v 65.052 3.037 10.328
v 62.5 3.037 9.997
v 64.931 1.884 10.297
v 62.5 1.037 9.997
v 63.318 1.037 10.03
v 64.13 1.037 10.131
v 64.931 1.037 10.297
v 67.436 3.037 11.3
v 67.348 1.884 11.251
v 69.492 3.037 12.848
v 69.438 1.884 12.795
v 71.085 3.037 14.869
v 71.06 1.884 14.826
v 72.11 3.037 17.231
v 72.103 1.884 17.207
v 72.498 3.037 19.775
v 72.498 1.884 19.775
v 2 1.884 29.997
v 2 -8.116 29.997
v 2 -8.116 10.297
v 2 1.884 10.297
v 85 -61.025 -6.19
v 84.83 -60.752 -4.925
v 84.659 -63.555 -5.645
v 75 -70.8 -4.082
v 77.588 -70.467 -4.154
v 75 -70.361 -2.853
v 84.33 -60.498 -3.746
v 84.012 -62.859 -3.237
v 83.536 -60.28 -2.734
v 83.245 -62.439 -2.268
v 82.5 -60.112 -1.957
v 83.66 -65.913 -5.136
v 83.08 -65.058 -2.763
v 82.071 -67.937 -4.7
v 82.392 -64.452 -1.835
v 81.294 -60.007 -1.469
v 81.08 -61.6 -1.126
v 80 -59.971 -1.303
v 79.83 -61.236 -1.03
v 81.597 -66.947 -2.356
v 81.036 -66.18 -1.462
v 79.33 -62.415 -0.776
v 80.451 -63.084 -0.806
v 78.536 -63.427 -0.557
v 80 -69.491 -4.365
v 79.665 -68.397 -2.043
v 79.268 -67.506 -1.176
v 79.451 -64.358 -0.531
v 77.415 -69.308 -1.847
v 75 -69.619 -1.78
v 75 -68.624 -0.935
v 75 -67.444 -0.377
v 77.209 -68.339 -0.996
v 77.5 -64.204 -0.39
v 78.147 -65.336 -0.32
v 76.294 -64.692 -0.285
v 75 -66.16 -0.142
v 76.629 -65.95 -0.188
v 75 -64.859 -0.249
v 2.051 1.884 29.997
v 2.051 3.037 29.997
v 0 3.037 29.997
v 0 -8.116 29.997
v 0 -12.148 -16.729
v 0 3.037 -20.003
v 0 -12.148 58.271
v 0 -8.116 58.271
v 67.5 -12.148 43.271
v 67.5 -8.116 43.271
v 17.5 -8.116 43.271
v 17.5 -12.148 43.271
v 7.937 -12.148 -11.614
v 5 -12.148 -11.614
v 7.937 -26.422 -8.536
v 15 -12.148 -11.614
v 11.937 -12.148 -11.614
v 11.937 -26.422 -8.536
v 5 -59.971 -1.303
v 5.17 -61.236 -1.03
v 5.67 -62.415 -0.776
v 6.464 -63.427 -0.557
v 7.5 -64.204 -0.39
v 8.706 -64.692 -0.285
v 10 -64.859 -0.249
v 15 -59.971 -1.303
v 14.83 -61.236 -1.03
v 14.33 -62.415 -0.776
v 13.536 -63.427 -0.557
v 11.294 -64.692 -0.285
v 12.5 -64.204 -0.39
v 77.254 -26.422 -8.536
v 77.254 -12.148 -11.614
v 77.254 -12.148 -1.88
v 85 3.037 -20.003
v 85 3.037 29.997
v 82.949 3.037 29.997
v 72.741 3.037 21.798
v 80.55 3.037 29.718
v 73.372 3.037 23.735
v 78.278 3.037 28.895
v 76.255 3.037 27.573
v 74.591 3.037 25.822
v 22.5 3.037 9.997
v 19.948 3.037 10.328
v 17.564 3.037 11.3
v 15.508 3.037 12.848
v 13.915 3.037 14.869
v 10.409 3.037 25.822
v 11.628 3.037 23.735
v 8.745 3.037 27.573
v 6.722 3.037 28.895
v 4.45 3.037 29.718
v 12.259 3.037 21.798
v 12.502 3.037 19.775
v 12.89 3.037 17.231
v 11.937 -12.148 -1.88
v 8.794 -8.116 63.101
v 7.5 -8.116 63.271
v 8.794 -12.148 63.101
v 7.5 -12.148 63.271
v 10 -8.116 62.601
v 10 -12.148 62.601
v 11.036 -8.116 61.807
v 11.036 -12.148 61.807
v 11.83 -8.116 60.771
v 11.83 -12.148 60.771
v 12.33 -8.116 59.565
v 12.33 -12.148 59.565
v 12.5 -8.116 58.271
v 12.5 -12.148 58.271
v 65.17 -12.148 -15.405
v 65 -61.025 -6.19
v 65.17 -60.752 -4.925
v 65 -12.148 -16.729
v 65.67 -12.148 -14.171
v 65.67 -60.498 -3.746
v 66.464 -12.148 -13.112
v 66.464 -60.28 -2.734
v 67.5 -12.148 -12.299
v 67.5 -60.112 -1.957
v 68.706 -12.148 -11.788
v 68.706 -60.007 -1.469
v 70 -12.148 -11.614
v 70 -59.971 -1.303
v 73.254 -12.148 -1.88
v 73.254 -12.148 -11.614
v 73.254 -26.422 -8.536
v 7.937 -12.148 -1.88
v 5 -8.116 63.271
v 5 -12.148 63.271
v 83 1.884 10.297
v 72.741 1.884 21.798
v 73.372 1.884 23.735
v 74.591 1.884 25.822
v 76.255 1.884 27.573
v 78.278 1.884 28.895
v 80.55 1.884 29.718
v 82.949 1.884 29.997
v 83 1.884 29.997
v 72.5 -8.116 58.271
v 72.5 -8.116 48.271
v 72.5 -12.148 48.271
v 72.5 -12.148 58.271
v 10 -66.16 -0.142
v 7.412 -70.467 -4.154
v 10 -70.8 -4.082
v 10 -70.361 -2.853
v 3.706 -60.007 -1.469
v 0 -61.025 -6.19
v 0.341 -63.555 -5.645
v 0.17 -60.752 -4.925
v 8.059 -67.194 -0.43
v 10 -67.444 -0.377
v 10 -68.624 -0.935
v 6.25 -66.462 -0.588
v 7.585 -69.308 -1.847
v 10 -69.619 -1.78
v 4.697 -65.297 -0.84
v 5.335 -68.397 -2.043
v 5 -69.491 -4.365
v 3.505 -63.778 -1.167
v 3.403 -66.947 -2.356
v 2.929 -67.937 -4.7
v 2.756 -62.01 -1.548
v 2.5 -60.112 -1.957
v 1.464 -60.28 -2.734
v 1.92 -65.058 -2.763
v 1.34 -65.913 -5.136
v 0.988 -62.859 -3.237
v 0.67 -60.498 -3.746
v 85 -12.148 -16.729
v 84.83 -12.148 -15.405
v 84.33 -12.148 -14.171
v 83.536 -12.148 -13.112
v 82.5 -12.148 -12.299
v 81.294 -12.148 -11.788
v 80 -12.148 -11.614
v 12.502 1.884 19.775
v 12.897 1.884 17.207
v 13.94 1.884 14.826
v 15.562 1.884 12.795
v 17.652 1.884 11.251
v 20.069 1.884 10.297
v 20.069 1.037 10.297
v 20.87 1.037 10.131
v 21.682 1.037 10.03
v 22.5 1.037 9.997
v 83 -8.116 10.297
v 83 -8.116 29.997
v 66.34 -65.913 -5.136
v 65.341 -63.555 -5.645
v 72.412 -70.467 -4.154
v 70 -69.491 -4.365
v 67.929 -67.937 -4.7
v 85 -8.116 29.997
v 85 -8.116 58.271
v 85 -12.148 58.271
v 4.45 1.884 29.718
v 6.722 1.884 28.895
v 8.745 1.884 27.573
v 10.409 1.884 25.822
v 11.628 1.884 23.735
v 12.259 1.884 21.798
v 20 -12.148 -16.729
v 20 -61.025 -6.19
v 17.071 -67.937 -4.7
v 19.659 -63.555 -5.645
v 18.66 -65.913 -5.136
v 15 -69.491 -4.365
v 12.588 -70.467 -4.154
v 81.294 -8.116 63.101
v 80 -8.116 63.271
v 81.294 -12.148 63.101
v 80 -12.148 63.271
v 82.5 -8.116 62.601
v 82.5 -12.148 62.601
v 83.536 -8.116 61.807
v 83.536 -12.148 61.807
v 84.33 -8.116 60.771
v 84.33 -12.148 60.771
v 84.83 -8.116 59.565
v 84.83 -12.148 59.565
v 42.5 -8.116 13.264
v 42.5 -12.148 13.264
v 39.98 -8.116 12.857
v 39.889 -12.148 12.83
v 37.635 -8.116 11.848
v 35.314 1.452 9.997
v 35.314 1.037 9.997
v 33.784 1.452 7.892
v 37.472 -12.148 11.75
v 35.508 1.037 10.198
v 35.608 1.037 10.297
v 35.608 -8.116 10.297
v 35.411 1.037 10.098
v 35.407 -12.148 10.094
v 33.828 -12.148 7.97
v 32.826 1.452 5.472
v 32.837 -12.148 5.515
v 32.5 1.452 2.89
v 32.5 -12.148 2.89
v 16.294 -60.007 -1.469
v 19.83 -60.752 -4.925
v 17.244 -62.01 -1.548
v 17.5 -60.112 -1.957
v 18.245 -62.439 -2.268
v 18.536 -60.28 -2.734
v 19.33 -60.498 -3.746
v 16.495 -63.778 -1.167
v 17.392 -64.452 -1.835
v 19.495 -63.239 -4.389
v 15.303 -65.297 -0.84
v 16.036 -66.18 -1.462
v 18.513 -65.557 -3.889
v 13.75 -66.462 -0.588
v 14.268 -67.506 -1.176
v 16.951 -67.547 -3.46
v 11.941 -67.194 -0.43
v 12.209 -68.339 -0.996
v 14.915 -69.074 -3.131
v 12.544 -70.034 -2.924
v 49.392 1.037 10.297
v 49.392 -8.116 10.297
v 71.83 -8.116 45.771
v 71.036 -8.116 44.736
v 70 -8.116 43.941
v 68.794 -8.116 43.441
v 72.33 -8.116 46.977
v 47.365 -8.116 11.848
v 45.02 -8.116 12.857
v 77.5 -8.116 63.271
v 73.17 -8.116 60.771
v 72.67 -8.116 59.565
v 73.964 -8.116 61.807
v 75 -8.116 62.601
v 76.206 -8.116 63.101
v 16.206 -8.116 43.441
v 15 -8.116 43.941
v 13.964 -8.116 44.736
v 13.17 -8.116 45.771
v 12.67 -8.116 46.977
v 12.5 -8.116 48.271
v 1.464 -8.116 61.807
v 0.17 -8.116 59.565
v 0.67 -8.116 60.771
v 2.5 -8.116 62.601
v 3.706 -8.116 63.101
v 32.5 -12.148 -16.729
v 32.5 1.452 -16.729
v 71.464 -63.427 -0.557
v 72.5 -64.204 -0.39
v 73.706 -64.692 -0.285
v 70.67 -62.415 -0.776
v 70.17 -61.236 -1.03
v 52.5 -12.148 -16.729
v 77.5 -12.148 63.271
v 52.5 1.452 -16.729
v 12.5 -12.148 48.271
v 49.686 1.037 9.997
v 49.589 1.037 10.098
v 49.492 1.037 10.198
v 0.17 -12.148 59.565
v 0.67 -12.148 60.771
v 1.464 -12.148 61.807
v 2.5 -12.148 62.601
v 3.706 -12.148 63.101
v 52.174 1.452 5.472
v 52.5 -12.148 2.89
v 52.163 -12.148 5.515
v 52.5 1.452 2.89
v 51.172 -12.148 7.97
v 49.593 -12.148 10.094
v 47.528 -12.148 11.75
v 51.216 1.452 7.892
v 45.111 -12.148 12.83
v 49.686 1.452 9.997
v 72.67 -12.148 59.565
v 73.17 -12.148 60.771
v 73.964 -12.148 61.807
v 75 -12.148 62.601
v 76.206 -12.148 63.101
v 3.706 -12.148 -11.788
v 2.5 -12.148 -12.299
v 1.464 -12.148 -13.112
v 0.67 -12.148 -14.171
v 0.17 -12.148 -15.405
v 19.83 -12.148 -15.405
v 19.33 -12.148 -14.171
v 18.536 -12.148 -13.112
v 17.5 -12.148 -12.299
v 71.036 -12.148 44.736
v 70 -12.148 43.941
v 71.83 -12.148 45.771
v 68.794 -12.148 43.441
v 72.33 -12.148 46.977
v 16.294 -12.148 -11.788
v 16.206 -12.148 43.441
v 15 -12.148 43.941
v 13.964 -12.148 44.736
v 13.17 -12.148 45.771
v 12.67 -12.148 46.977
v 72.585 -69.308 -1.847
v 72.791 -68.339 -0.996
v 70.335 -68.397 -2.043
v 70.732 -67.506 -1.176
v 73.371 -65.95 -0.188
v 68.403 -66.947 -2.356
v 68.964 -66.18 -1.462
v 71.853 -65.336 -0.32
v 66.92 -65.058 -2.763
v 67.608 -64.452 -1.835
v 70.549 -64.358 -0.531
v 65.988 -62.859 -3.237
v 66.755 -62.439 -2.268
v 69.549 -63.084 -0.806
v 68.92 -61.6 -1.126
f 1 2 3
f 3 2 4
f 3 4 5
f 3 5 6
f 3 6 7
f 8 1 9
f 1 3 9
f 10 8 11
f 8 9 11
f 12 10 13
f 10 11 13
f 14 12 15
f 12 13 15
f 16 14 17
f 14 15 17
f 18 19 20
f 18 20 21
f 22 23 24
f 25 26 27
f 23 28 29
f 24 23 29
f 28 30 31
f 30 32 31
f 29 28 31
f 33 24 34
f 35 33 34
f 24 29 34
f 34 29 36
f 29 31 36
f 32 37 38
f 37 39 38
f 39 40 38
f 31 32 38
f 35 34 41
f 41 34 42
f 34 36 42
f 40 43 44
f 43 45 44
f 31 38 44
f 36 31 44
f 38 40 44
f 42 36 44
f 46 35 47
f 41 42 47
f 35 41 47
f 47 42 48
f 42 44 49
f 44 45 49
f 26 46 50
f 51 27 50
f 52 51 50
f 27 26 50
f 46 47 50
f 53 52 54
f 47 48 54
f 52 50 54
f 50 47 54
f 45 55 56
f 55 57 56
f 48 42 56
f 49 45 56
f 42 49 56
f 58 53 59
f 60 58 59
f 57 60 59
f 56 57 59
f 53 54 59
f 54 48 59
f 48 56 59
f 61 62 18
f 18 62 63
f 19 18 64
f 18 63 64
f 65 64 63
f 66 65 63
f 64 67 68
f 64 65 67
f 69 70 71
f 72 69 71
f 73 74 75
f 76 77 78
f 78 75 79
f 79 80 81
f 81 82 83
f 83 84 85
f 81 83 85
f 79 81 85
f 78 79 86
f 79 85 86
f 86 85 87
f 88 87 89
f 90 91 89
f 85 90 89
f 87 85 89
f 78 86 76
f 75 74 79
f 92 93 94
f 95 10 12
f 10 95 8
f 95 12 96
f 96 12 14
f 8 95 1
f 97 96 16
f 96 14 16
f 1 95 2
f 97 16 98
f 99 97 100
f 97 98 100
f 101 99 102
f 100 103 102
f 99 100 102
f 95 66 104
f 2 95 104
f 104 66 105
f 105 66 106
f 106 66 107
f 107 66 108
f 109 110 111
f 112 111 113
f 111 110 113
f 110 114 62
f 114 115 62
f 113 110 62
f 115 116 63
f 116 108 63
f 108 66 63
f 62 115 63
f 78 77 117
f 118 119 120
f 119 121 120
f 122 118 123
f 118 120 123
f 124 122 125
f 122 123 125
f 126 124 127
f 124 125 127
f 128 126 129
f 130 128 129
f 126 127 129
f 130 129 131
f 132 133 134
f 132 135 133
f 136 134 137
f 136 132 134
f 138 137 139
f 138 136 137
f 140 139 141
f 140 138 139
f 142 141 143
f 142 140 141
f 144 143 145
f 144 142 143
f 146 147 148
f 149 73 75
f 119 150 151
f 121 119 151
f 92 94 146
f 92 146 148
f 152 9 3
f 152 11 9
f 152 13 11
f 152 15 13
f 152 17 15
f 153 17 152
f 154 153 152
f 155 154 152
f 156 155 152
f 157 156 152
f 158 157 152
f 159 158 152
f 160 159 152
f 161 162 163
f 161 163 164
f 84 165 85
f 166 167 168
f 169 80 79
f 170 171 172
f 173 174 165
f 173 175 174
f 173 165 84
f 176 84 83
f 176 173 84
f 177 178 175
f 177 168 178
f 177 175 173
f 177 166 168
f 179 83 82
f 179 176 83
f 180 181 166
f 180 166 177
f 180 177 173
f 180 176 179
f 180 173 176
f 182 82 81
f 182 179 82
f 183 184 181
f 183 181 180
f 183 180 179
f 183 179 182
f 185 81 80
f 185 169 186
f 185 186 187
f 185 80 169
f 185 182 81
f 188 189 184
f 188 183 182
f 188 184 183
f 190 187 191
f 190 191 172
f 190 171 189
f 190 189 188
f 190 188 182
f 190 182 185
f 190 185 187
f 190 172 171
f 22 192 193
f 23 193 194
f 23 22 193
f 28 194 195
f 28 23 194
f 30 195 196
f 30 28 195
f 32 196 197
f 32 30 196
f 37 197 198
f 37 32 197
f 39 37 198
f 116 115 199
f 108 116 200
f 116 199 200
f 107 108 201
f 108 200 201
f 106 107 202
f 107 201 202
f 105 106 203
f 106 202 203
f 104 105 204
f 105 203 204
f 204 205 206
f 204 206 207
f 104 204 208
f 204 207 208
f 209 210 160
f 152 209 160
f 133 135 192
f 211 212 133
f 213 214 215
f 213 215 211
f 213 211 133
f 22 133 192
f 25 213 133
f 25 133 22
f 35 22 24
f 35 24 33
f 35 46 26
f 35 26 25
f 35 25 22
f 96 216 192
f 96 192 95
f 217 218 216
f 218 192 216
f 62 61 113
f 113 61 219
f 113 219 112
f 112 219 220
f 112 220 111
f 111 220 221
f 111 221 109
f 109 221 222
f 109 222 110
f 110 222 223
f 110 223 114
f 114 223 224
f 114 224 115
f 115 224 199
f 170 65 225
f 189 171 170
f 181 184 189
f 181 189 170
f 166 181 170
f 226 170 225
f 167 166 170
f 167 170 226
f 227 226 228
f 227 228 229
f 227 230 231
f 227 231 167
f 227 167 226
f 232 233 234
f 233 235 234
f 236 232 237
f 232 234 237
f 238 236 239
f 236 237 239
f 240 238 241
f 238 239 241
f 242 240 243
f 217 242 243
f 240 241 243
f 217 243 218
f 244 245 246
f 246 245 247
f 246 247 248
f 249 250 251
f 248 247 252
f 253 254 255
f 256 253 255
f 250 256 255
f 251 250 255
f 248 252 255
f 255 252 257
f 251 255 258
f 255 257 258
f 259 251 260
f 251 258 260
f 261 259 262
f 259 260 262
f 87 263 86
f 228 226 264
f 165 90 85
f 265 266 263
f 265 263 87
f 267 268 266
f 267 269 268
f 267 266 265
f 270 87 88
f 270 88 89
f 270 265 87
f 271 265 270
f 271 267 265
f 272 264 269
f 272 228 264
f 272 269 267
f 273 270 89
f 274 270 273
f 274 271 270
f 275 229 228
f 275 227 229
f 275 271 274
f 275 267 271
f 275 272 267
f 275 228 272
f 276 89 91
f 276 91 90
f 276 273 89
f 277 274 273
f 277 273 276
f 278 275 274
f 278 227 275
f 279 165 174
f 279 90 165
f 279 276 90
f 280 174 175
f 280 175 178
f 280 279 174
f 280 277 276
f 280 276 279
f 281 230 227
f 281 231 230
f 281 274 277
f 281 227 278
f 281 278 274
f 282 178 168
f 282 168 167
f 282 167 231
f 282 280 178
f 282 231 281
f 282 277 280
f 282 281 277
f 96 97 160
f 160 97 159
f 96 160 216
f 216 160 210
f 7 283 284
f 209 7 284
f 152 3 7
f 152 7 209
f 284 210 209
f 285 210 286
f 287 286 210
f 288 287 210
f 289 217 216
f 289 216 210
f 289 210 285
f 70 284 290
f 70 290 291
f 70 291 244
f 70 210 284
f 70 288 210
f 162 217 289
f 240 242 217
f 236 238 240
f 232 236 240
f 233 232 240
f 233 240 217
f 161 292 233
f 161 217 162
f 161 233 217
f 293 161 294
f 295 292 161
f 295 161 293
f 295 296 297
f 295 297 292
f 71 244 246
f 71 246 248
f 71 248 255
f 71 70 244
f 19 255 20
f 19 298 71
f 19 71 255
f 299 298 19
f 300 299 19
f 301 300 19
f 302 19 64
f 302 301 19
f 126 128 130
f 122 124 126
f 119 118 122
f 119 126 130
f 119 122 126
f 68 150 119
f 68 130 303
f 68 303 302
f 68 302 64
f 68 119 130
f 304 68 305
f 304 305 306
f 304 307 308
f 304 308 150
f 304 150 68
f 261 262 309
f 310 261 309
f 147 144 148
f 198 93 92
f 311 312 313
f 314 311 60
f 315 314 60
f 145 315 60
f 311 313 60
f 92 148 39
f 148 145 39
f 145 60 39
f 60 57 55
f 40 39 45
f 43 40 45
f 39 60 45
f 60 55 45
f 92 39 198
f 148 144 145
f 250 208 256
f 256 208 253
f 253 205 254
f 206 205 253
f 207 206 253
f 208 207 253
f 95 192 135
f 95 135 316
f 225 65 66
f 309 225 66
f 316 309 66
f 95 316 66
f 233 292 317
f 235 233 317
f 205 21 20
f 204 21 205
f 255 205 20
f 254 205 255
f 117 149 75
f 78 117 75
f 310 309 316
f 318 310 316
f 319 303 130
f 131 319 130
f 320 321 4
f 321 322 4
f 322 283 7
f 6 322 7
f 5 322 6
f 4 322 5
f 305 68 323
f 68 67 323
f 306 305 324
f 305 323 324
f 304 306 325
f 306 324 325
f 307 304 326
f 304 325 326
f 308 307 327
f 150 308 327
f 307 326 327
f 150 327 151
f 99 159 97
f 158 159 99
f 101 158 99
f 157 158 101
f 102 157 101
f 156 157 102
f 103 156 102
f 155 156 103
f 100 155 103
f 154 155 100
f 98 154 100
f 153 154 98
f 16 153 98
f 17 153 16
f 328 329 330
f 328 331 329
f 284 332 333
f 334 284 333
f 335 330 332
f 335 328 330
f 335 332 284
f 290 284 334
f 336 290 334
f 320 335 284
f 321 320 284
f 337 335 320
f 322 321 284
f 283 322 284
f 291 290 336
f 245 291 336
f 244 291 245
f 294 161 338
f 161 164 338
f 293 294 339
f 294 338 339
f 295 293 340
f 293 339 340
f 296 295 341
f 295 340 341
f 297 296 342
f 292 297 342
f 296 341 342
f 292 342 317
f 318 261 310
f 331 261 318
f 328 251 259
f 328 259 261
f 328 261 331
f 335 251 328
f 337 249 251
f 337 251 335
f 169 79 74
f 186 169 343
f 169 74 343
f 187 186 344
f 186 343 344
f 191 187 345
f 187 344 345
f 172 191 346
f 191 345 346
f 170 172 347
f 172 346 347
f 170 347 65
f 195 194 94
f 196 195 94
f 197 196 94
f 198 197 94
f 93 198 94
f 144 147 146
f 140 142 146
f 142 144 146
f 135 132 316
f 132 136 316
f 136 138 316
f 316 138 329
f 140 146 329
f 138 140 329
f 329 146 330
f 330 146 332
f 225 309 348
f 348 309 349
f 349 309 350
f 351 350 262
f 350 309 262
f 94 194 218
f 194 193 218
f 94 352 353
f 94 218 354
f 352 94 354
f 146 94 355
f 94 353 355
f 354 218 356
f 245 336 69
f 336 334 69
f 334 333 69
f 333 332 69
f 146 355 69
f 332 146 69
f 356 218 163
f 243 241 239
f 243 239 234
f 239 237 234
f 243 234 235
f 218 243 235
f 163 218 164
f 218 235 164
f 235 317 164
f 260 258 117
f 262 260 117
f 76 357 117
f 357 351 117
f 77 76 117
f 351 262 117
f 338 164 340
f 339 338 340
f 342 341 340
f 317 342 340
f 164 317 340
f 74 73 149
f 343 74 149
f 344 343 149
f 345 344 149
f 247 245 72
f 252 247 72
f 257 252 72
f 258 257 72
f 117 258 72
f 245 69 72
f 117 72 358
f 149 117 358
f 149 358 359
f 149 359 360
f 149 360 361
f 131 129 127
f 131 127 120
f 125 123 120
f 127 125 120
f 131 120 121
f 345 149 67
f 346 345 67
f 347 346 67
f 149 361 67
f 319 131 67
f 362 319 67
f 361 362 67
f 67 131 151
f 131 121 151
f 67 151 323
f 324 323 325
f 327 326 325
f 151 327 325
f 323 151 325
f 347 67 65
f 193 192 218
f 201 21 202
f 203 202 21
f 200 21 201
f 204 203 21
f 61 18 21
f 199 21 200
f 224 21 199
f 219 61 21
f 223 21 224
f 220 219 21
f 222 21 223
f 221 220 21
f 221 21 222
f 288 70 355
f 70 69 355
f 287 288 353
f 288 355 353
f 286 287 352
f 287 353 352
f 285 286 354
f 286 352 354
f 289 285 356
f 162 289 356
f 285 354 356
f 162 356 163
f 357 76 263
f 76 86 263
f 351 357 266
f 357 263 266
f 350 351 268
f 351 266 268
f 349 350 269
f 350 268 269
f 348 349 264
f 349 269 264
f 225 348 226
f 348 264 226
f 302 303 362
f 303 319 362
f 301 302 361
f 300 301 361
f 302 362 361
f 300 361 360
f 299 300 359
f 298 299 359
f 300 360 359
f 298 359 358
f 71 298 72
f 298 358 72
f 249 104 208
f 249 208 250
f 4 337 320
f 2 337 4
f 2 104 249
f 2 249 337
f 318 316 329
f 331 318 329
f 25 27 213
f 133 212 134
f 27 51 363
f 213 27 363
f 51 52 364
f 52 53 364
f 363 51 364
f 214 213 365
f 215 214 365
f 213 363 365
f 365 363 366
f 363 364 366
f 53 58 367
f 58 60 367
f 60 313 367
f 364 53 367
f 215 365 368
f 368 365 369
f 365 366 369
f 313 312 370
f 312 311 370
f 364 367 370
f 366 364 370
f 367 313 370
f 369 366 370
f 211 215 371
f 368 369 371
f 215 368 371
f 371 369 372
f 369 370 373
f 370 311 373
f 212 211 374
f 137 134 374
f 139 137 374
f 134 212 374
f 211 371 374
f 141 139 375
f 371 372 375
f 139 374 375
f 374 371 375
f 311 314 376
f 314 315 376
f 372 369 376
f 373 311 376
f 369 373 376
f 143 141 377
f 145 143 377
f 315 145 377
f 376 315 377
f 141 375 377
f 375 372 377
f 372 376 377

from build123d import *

# Parameters (mm, degrees)
F1_DEPTH      = 85
F3_W          = 81
F3_H          = 10
F4_DEPTH      = 20
F7_DEPTH      = 13.6
F9_W          = 60
F9_H          = 20
F10_DEPTH     = 2
F12_W         = 20
F12_H         = 60
F13_DEPTH     = 5
F14_T1_DEPTH  = 55
F15_R         = 4.99999
F16_R         = 10
F18_W         = 60
F18_H         = 20
F19_DEPTH     = 4.5
F20_R         = 5
F21_R         = 10.4535447251
F22_W         = 4
F22_H         = 13
F23_DEPTH     = 20
F24_T4_DEPTH  = 107.6390188569
F25_W         = 4
F25_H         = 9.7337032971
F26_DEPTH     = 15
F27_T4_DEPTH  = 81.7292641427
F28_T1_DEPTH  = 4.0324145269
F28_T6_DEPTH  = 55.9380061179
F28_T13_DEPTH = 55.9380061179
F28_T20_DEPTH = 29.9852103224
F28_T26_DEPTH = 55.9380061179


# Not quite as in the source:
# - a fillet or chamfer that OpenCascade refuses, or shapes differently, is made with other operations: its cross-section is extruded or revolved along the edge and cut away or added
# - a fillet or chamfer is up to 0.001 mm smaller than in the source, because OpenCascade refuses the exact size


with BuildPart() as f1:
    # F0 (on Right) → F1 (new body)
    with BuildSketch(Plane.YZ):
        Polygon((-12.1484044939, 63.271041885), (-12.1484044939, -16.728958115), (3.0366472241, -20.0031517962), (3.0366472241, 29.9968482038), (-8.115989967, 29.9968482038), (-8.115989967, 63.271041885), align=None)
    extrude(amount=F1_DEPTH)

    # F3 (on offset) → F4 (cut)
    with BuildSketch(Plane.XY.offset(30.2968482038)):
        with Locations((42.5, -3.115989967)):
            Rectangle(F3_W, F3_H)
    extrude(amount=-F4_DEPTH, mode=Mode.SUBTRACT)

    # F6 (on offset) → F7 (cut)
    with BuildSketch(Plane.XZ.offset(12.1484044939)):
        Polygon((32.5, -16.728958115), (42.5, -16.728958115), (52.5, -16.728958115), (52.5, 13.271041885), (42.5, 13.271041885), (32.5, 13.271041885), align=None)
    extrude(amount=-F7_DEPTH, mode=Mode.SUBTRACT)

    # F9 (on offset) → F10 (cut)
    with BuildSketch(Plane(origin=(0, 3.0366472241, 0), x_dir=(-1, 0, 0), z_dir=(0, 1, 0))):
        with Locations((-42.5, 19.9968482038)):
            Rectangle(F9_W, F9_H)
    extrude(amount=-F10_DEPTH, mode=Mode.SUBTRACT)

    # F12 (on offset) → F13 (join)
    with BuildSketch(Plane(origin=(0, -3.986549235, -18.488813492), x_dir=(1, 0, 0), z_dir=(0, -0.210775525, -0.9775344894))):
        with Locations((75, 38.3494294545)):
            Rectangle(F12_W, F12_H)
        with Locations((10, 38.3494294545)):
            Rectangle(F12_W, F12_H)
    extrude(amount=-F13_DEPTH)

    # F14: fillet of radius 10 on 4 edges, made by hand

    # F14_s2 → F14_t1 (cut)
    with BuildSketch(Plane(origin=(0, -9.2559373608, -42.927175728), x_dir=(1, 0, 0), z_dir=(0, 0.210775525, 0.9775344894))):
        with BuildLine():
            ThreePointArc((75, -68.3494294545), (67.9289321881, -65.4204972664), (65, -58.3494294545))
            Line((65, -58.3494294545), (65, -68.3494294545))
            Line((65, -68.3494294545), (75, -68.3494294545))
        make_face()
        with BuildLine():
            ThreePointArc((10, -68.3494294545), (2.9289321881, -65.4204972664), (0, -58.3494294545))
            Line((0, -58.3494294545), (0, -68.3494294545))
            Line((0, -68.3494294545), (10, -68.3494294545))
        make_face()
        with BuildLine():
            ThreePointArc((20, -58.3494294545), (17.0710678119, -65.4204972664), (10, -68.3494294545))
            Line((10, -68.3494294545), (20, -68.3494294545))
            Line((20, -68.3494294545), (20, -58.3494294545))
        make_face()
        with BuildLine():
            ThreePointArc((75, -68.3494294545), (82.0710678119, -65.4204972664), (85, -58.3494294545))
            Line((85, -58.3494294545), (85, -68.3494294545))
            Line((85, -68.3494294545), (75, -68.3494294545))
        make_face()
    extrude(amount=F14_T1_DEPTH, mode=Mode.SUBTRACT)

    # F15 (radius 5 in the source; OpenCascade refuses exactly that, so slightly less here)
    f15_edges = [f1.edges().sort_by_distance(p)[0] for p in [
        (85, -36.059828, -6.458279),
        (20, -36.059828, -6.458279),
    ]]
    fillet(f15_edges, radius=F15_R)

    # F16
    f16_edges = [f1.edges().sort_by_distance(p)[0] for p in [
        (12.5, 2.036647, 9.996848),
        (72.5, 2.036647, 9.996848),
    ]]
    fillet(f16_edges, radius=F16_R)

    # F18 (on offset) → F19 (cut)
    with BuildSketch(Plane(origin=(0, -8.115989967, 0), x_dir=(-1, 0, 0), z_dir=(0, 1, 0))):
        with Locations((-42.5, 53.271041885)):
            Rectangle(F18_W, F18_H)
    extrude(amount=-F19_DEPTH, mode=Mode.SUBTRACT)

    # F20
    f20_edges = [f1.edges().sort_by_distance(p)[0] for p in [
        (72.5, -10.132197, 63.271042),
        (85, -10.132197, 63.271042),
        (72.5, -10.132197, 43.271042),
        (12.5, -10.132197, 43.271042),
        (12.5, -10.132197, 63.271042),
        (0, -10.132197, 63.271042),
    ]]
    fillet(f20_edges, radius=F20_R)

    # F21
    f21_edges = [f1.edges().sort_by_distance(p)[0] for p in [
        (72.5, 2.460329, 29.996848),
        (12.5, 2.460329, 29.996848),
    ]]
    fillet(f21_edges, radius=F21_R)

    # F22 (on offset) → F23 (join)
    with BuildSketch(Plane(origin=(0, -8.115989967, 0), x_dir=(-1, 0, 0), z_dir=(0, 1, 0))):
        with Locations((-9.9369510557, -6.5)):
            Rectangle(F22_W, F22_H)
    extrude(amount=-F23_DEPTH)

    # F24: chamfer of 20 x 9.3261531631 on 1 edges, made by hand


with BuildPart() as f24_tool2:
    # F24_s3 → F24_t4 (new body)
    with BuildSketch(Plane.YZ.offset(-43.8825583727)):
        Polygon((-8.115989967, 0), (-28.115989967, -9.3261531631), (-28.115989967, 0), align=None)
    extrude(amount=F24_T4_DEPTH)

    split(bisect_by=Plane.XZ.offset(12.1484044939), keep=Keep.TOP)

    split(bisect_by=Plane(origin=(0, -2.9326716098, -13.6011410448), x_dir=(1, 0, 0), z_dir=(0, 0.210775525, 0.9775344894)), keep=Keep.TOP)


with BuildPart() as f1_1:
    add(f1.part)

    # F24_t1: cut F24_tool2
    add(f24_tool2.part, mode=Mode.SUBTRACT)

    # F25 (on face) → F26 (join)
    with BuildSketch(Plane.XZ.offset(12.1484044939)):
        with Locations((75.2541754842, -6.7471974233)):
            Rectangle(F25_W, F25_H)
    extrude(amount=F26_DEPTH)

    # F27: chamfer of 15 x 6.9946148723 on 1 edges, made by hand


with BuildPart() as f27_tool2:
    # F27_s3 → F27_t4 (new body)
    with BuildSketch(Plane.YZ.offset(116.1188075555)):
        Polygon((-12.1484044939, -1.8803457748), (-27.1484044939, -8.8749606471), (-27.1484044939, -1.8803457748), align=None)
    extrude(amount=-F27_T4_DEPTH)

    split(bisect_by=Plane.XZ.offset(12.1484044939), keep=Keep.TOP)

    split(bisect_by=Plane(origin=(0, -2.9326716098, -13.6011410448), x_dir=(1, 0, 0), z_dir=(0, 0.210775525, 0.9775344894)), keep=Keep.TOP)


with BuildPart() as f1_2:
    add(f1_1.part)

    # F27_t1: cut F27_tool2
    add(f27_tool2.part, mode=Mode.SUBTRACT)

    # F28: fillet of radius 10.3811183182 on 2 edges, made by hand

    # F28_s2 → F28_t1 (join)
    with BuildSketch(Plane.XZ.offset(8.115989967)):
        with BuildLine():
            ThreePointArc((42.8811183182, 13.271041885), (35.5405591591, 10.2304827259), (32.5, 2.8899235668))
            Line((32.5, 2.8899235668), (32.5, 13.271041885))
            Line((32.5, 13.271041885), (42.8811183182, 13.271041885))
        make_face()
        with BuildLine():
            ThreePointArc((52.5, 2.8899235668), (49.4594408409, 10.2304827259), (42.1188816818, 13.271041885))
            Line((42.1188816818, 13.271041885), (52.5, 13.271041885))
            Line((52.5, 13.271041885), (52.5, 2.8899235668))
        make_face()
    extrude(amount=F28_T1_DEPTH)


with BuildPart() as f28_tool4:
    # F28_s5 → F28_t6 (new body)
    with BuildSketch(Plane.XZ.offset(38.1012002894)):
        with BuildLine():
            ThreePointArc((42.8811183182, 13.271041885), (35.5405591591, 10.2304827259), (32.5, 2.8899235668))
            Line((32.5, 2.8899235668), (32.5, 13.271041885))
            Line((32.5, 13.271041885), (42.8811183182, 13.271041885))
        make_face()
    extrude(amount=-F28_T6_DEPTH)

    split(bisect_by=Plane.XZ.offset(-1.0366472241), keep=Keep.TOP)

    split(bisect_by=Plane.XY.offset(10.2968482038), keep=Keep.BOTTOM)

    split(bisect_by=Plane.XZ.offset(8.115989967), keep=Keep.BOTTOM)


with BuildPart() as f1_3:
    add(f1_2.part)

    # F28_t3: union F28_tool4
    add(f28_tool4.part)


with BuildPart() as f28_tool11:
    # F28_s12 → F28_t13 (new body)
    with BuildSketch(Plane.XZ.offset(38.1012002894)):
        with BuildLine():
            ThreePointArc((42.8811183182, 13.271041885), (35.5405591591, 10.2304827259), (32.5, 2.8899235668))
            Line((32.5, 2.8899235668), (32.5, 13.271041885))
            Line((32.5, 13.271041885), (42.8811183182, 13.271041885))
        make_face()
    extrude(amount=-F28_T13_DEPTH)

    split(bisect_by=Plane.XY.offset(9.9968482038), keep=Keep.BOTTOM)

    split(bisect_by=Plane.XZ.offset(8.115989967), keep=Keep.BOTTOM)

    split(bisect_by=Plane.XZ.offset(-3.0366472241), keep=Keep.TOP)


with BuildPart() as f1_4:
    add(f1_3.part)

    # F28_t10: union F28_tool11
    add(f28_tool11.part)


with BuildPart() as f28_tool18:
    # F28_s19 → F28_t20 (new body)
    with BuildSketch(Plane.XZ.offset(12.1484044939)):
        with BuildLine():
            ThreePointArc((52.5, 2.8899235668), (49.4594408409, 10.2304827259), (42.1188816818, 13.271041885))
            Line((42.1188816818, 13.271041885), (52.5, 13.271041885))
            Line((52.5, 13.271041885), (52.5, 2.8899235668))
        make_face()
    extrude(amount=-F28_T20_DEPTH)

    split(bisect_by=Plane.XY.offset(10.2968482038), keep=Keep.BOTTOM)

    split(bisect_by=Plane.XZ.offset(-1.0366472241), keep=Keep.TOP)


with BuildPart() as f1_5:
    add(f1_4.part)

    # F28_t17: union F28_tool18
    add(f28_tool18.part)


with BuildPart() as f28_tool24:
    # F28_s25 → F28_t26 (new body)
    with BuildSketch(Plane.XZ.offset(38.1012002894)):
        with BuildLine():
            ThreePointArc((52.5, 2.8899235668), (49.4594408409, 10.2304827259), (42.1188816818, 13.271041885))
            Line((42.1188816818, 13.271041885), (52.5, 13.271041885))
            Line((52.5, 13.271041885), (52.5, 2.8899235668))
        make_face()
    extrude(amount=-F28_T26_DEPTH)

    split(bisect_by=Plane.XY.offset(9.9968482038), keep=Keep.BOTTOM)

    split(bisect_by=Plane.XZ.offset(8.115989967), keep=Keep.BOTTOM)

    split(bisect_by=Plane.XZ.offset(-3.0366472241), keep=Keep.TOP)


with BuildPart() as f1_6:
    add(f1_5.part)

    # F28_t23: union F28_tool24
    add(f28_tool24.part)


solid = f1_6.part
